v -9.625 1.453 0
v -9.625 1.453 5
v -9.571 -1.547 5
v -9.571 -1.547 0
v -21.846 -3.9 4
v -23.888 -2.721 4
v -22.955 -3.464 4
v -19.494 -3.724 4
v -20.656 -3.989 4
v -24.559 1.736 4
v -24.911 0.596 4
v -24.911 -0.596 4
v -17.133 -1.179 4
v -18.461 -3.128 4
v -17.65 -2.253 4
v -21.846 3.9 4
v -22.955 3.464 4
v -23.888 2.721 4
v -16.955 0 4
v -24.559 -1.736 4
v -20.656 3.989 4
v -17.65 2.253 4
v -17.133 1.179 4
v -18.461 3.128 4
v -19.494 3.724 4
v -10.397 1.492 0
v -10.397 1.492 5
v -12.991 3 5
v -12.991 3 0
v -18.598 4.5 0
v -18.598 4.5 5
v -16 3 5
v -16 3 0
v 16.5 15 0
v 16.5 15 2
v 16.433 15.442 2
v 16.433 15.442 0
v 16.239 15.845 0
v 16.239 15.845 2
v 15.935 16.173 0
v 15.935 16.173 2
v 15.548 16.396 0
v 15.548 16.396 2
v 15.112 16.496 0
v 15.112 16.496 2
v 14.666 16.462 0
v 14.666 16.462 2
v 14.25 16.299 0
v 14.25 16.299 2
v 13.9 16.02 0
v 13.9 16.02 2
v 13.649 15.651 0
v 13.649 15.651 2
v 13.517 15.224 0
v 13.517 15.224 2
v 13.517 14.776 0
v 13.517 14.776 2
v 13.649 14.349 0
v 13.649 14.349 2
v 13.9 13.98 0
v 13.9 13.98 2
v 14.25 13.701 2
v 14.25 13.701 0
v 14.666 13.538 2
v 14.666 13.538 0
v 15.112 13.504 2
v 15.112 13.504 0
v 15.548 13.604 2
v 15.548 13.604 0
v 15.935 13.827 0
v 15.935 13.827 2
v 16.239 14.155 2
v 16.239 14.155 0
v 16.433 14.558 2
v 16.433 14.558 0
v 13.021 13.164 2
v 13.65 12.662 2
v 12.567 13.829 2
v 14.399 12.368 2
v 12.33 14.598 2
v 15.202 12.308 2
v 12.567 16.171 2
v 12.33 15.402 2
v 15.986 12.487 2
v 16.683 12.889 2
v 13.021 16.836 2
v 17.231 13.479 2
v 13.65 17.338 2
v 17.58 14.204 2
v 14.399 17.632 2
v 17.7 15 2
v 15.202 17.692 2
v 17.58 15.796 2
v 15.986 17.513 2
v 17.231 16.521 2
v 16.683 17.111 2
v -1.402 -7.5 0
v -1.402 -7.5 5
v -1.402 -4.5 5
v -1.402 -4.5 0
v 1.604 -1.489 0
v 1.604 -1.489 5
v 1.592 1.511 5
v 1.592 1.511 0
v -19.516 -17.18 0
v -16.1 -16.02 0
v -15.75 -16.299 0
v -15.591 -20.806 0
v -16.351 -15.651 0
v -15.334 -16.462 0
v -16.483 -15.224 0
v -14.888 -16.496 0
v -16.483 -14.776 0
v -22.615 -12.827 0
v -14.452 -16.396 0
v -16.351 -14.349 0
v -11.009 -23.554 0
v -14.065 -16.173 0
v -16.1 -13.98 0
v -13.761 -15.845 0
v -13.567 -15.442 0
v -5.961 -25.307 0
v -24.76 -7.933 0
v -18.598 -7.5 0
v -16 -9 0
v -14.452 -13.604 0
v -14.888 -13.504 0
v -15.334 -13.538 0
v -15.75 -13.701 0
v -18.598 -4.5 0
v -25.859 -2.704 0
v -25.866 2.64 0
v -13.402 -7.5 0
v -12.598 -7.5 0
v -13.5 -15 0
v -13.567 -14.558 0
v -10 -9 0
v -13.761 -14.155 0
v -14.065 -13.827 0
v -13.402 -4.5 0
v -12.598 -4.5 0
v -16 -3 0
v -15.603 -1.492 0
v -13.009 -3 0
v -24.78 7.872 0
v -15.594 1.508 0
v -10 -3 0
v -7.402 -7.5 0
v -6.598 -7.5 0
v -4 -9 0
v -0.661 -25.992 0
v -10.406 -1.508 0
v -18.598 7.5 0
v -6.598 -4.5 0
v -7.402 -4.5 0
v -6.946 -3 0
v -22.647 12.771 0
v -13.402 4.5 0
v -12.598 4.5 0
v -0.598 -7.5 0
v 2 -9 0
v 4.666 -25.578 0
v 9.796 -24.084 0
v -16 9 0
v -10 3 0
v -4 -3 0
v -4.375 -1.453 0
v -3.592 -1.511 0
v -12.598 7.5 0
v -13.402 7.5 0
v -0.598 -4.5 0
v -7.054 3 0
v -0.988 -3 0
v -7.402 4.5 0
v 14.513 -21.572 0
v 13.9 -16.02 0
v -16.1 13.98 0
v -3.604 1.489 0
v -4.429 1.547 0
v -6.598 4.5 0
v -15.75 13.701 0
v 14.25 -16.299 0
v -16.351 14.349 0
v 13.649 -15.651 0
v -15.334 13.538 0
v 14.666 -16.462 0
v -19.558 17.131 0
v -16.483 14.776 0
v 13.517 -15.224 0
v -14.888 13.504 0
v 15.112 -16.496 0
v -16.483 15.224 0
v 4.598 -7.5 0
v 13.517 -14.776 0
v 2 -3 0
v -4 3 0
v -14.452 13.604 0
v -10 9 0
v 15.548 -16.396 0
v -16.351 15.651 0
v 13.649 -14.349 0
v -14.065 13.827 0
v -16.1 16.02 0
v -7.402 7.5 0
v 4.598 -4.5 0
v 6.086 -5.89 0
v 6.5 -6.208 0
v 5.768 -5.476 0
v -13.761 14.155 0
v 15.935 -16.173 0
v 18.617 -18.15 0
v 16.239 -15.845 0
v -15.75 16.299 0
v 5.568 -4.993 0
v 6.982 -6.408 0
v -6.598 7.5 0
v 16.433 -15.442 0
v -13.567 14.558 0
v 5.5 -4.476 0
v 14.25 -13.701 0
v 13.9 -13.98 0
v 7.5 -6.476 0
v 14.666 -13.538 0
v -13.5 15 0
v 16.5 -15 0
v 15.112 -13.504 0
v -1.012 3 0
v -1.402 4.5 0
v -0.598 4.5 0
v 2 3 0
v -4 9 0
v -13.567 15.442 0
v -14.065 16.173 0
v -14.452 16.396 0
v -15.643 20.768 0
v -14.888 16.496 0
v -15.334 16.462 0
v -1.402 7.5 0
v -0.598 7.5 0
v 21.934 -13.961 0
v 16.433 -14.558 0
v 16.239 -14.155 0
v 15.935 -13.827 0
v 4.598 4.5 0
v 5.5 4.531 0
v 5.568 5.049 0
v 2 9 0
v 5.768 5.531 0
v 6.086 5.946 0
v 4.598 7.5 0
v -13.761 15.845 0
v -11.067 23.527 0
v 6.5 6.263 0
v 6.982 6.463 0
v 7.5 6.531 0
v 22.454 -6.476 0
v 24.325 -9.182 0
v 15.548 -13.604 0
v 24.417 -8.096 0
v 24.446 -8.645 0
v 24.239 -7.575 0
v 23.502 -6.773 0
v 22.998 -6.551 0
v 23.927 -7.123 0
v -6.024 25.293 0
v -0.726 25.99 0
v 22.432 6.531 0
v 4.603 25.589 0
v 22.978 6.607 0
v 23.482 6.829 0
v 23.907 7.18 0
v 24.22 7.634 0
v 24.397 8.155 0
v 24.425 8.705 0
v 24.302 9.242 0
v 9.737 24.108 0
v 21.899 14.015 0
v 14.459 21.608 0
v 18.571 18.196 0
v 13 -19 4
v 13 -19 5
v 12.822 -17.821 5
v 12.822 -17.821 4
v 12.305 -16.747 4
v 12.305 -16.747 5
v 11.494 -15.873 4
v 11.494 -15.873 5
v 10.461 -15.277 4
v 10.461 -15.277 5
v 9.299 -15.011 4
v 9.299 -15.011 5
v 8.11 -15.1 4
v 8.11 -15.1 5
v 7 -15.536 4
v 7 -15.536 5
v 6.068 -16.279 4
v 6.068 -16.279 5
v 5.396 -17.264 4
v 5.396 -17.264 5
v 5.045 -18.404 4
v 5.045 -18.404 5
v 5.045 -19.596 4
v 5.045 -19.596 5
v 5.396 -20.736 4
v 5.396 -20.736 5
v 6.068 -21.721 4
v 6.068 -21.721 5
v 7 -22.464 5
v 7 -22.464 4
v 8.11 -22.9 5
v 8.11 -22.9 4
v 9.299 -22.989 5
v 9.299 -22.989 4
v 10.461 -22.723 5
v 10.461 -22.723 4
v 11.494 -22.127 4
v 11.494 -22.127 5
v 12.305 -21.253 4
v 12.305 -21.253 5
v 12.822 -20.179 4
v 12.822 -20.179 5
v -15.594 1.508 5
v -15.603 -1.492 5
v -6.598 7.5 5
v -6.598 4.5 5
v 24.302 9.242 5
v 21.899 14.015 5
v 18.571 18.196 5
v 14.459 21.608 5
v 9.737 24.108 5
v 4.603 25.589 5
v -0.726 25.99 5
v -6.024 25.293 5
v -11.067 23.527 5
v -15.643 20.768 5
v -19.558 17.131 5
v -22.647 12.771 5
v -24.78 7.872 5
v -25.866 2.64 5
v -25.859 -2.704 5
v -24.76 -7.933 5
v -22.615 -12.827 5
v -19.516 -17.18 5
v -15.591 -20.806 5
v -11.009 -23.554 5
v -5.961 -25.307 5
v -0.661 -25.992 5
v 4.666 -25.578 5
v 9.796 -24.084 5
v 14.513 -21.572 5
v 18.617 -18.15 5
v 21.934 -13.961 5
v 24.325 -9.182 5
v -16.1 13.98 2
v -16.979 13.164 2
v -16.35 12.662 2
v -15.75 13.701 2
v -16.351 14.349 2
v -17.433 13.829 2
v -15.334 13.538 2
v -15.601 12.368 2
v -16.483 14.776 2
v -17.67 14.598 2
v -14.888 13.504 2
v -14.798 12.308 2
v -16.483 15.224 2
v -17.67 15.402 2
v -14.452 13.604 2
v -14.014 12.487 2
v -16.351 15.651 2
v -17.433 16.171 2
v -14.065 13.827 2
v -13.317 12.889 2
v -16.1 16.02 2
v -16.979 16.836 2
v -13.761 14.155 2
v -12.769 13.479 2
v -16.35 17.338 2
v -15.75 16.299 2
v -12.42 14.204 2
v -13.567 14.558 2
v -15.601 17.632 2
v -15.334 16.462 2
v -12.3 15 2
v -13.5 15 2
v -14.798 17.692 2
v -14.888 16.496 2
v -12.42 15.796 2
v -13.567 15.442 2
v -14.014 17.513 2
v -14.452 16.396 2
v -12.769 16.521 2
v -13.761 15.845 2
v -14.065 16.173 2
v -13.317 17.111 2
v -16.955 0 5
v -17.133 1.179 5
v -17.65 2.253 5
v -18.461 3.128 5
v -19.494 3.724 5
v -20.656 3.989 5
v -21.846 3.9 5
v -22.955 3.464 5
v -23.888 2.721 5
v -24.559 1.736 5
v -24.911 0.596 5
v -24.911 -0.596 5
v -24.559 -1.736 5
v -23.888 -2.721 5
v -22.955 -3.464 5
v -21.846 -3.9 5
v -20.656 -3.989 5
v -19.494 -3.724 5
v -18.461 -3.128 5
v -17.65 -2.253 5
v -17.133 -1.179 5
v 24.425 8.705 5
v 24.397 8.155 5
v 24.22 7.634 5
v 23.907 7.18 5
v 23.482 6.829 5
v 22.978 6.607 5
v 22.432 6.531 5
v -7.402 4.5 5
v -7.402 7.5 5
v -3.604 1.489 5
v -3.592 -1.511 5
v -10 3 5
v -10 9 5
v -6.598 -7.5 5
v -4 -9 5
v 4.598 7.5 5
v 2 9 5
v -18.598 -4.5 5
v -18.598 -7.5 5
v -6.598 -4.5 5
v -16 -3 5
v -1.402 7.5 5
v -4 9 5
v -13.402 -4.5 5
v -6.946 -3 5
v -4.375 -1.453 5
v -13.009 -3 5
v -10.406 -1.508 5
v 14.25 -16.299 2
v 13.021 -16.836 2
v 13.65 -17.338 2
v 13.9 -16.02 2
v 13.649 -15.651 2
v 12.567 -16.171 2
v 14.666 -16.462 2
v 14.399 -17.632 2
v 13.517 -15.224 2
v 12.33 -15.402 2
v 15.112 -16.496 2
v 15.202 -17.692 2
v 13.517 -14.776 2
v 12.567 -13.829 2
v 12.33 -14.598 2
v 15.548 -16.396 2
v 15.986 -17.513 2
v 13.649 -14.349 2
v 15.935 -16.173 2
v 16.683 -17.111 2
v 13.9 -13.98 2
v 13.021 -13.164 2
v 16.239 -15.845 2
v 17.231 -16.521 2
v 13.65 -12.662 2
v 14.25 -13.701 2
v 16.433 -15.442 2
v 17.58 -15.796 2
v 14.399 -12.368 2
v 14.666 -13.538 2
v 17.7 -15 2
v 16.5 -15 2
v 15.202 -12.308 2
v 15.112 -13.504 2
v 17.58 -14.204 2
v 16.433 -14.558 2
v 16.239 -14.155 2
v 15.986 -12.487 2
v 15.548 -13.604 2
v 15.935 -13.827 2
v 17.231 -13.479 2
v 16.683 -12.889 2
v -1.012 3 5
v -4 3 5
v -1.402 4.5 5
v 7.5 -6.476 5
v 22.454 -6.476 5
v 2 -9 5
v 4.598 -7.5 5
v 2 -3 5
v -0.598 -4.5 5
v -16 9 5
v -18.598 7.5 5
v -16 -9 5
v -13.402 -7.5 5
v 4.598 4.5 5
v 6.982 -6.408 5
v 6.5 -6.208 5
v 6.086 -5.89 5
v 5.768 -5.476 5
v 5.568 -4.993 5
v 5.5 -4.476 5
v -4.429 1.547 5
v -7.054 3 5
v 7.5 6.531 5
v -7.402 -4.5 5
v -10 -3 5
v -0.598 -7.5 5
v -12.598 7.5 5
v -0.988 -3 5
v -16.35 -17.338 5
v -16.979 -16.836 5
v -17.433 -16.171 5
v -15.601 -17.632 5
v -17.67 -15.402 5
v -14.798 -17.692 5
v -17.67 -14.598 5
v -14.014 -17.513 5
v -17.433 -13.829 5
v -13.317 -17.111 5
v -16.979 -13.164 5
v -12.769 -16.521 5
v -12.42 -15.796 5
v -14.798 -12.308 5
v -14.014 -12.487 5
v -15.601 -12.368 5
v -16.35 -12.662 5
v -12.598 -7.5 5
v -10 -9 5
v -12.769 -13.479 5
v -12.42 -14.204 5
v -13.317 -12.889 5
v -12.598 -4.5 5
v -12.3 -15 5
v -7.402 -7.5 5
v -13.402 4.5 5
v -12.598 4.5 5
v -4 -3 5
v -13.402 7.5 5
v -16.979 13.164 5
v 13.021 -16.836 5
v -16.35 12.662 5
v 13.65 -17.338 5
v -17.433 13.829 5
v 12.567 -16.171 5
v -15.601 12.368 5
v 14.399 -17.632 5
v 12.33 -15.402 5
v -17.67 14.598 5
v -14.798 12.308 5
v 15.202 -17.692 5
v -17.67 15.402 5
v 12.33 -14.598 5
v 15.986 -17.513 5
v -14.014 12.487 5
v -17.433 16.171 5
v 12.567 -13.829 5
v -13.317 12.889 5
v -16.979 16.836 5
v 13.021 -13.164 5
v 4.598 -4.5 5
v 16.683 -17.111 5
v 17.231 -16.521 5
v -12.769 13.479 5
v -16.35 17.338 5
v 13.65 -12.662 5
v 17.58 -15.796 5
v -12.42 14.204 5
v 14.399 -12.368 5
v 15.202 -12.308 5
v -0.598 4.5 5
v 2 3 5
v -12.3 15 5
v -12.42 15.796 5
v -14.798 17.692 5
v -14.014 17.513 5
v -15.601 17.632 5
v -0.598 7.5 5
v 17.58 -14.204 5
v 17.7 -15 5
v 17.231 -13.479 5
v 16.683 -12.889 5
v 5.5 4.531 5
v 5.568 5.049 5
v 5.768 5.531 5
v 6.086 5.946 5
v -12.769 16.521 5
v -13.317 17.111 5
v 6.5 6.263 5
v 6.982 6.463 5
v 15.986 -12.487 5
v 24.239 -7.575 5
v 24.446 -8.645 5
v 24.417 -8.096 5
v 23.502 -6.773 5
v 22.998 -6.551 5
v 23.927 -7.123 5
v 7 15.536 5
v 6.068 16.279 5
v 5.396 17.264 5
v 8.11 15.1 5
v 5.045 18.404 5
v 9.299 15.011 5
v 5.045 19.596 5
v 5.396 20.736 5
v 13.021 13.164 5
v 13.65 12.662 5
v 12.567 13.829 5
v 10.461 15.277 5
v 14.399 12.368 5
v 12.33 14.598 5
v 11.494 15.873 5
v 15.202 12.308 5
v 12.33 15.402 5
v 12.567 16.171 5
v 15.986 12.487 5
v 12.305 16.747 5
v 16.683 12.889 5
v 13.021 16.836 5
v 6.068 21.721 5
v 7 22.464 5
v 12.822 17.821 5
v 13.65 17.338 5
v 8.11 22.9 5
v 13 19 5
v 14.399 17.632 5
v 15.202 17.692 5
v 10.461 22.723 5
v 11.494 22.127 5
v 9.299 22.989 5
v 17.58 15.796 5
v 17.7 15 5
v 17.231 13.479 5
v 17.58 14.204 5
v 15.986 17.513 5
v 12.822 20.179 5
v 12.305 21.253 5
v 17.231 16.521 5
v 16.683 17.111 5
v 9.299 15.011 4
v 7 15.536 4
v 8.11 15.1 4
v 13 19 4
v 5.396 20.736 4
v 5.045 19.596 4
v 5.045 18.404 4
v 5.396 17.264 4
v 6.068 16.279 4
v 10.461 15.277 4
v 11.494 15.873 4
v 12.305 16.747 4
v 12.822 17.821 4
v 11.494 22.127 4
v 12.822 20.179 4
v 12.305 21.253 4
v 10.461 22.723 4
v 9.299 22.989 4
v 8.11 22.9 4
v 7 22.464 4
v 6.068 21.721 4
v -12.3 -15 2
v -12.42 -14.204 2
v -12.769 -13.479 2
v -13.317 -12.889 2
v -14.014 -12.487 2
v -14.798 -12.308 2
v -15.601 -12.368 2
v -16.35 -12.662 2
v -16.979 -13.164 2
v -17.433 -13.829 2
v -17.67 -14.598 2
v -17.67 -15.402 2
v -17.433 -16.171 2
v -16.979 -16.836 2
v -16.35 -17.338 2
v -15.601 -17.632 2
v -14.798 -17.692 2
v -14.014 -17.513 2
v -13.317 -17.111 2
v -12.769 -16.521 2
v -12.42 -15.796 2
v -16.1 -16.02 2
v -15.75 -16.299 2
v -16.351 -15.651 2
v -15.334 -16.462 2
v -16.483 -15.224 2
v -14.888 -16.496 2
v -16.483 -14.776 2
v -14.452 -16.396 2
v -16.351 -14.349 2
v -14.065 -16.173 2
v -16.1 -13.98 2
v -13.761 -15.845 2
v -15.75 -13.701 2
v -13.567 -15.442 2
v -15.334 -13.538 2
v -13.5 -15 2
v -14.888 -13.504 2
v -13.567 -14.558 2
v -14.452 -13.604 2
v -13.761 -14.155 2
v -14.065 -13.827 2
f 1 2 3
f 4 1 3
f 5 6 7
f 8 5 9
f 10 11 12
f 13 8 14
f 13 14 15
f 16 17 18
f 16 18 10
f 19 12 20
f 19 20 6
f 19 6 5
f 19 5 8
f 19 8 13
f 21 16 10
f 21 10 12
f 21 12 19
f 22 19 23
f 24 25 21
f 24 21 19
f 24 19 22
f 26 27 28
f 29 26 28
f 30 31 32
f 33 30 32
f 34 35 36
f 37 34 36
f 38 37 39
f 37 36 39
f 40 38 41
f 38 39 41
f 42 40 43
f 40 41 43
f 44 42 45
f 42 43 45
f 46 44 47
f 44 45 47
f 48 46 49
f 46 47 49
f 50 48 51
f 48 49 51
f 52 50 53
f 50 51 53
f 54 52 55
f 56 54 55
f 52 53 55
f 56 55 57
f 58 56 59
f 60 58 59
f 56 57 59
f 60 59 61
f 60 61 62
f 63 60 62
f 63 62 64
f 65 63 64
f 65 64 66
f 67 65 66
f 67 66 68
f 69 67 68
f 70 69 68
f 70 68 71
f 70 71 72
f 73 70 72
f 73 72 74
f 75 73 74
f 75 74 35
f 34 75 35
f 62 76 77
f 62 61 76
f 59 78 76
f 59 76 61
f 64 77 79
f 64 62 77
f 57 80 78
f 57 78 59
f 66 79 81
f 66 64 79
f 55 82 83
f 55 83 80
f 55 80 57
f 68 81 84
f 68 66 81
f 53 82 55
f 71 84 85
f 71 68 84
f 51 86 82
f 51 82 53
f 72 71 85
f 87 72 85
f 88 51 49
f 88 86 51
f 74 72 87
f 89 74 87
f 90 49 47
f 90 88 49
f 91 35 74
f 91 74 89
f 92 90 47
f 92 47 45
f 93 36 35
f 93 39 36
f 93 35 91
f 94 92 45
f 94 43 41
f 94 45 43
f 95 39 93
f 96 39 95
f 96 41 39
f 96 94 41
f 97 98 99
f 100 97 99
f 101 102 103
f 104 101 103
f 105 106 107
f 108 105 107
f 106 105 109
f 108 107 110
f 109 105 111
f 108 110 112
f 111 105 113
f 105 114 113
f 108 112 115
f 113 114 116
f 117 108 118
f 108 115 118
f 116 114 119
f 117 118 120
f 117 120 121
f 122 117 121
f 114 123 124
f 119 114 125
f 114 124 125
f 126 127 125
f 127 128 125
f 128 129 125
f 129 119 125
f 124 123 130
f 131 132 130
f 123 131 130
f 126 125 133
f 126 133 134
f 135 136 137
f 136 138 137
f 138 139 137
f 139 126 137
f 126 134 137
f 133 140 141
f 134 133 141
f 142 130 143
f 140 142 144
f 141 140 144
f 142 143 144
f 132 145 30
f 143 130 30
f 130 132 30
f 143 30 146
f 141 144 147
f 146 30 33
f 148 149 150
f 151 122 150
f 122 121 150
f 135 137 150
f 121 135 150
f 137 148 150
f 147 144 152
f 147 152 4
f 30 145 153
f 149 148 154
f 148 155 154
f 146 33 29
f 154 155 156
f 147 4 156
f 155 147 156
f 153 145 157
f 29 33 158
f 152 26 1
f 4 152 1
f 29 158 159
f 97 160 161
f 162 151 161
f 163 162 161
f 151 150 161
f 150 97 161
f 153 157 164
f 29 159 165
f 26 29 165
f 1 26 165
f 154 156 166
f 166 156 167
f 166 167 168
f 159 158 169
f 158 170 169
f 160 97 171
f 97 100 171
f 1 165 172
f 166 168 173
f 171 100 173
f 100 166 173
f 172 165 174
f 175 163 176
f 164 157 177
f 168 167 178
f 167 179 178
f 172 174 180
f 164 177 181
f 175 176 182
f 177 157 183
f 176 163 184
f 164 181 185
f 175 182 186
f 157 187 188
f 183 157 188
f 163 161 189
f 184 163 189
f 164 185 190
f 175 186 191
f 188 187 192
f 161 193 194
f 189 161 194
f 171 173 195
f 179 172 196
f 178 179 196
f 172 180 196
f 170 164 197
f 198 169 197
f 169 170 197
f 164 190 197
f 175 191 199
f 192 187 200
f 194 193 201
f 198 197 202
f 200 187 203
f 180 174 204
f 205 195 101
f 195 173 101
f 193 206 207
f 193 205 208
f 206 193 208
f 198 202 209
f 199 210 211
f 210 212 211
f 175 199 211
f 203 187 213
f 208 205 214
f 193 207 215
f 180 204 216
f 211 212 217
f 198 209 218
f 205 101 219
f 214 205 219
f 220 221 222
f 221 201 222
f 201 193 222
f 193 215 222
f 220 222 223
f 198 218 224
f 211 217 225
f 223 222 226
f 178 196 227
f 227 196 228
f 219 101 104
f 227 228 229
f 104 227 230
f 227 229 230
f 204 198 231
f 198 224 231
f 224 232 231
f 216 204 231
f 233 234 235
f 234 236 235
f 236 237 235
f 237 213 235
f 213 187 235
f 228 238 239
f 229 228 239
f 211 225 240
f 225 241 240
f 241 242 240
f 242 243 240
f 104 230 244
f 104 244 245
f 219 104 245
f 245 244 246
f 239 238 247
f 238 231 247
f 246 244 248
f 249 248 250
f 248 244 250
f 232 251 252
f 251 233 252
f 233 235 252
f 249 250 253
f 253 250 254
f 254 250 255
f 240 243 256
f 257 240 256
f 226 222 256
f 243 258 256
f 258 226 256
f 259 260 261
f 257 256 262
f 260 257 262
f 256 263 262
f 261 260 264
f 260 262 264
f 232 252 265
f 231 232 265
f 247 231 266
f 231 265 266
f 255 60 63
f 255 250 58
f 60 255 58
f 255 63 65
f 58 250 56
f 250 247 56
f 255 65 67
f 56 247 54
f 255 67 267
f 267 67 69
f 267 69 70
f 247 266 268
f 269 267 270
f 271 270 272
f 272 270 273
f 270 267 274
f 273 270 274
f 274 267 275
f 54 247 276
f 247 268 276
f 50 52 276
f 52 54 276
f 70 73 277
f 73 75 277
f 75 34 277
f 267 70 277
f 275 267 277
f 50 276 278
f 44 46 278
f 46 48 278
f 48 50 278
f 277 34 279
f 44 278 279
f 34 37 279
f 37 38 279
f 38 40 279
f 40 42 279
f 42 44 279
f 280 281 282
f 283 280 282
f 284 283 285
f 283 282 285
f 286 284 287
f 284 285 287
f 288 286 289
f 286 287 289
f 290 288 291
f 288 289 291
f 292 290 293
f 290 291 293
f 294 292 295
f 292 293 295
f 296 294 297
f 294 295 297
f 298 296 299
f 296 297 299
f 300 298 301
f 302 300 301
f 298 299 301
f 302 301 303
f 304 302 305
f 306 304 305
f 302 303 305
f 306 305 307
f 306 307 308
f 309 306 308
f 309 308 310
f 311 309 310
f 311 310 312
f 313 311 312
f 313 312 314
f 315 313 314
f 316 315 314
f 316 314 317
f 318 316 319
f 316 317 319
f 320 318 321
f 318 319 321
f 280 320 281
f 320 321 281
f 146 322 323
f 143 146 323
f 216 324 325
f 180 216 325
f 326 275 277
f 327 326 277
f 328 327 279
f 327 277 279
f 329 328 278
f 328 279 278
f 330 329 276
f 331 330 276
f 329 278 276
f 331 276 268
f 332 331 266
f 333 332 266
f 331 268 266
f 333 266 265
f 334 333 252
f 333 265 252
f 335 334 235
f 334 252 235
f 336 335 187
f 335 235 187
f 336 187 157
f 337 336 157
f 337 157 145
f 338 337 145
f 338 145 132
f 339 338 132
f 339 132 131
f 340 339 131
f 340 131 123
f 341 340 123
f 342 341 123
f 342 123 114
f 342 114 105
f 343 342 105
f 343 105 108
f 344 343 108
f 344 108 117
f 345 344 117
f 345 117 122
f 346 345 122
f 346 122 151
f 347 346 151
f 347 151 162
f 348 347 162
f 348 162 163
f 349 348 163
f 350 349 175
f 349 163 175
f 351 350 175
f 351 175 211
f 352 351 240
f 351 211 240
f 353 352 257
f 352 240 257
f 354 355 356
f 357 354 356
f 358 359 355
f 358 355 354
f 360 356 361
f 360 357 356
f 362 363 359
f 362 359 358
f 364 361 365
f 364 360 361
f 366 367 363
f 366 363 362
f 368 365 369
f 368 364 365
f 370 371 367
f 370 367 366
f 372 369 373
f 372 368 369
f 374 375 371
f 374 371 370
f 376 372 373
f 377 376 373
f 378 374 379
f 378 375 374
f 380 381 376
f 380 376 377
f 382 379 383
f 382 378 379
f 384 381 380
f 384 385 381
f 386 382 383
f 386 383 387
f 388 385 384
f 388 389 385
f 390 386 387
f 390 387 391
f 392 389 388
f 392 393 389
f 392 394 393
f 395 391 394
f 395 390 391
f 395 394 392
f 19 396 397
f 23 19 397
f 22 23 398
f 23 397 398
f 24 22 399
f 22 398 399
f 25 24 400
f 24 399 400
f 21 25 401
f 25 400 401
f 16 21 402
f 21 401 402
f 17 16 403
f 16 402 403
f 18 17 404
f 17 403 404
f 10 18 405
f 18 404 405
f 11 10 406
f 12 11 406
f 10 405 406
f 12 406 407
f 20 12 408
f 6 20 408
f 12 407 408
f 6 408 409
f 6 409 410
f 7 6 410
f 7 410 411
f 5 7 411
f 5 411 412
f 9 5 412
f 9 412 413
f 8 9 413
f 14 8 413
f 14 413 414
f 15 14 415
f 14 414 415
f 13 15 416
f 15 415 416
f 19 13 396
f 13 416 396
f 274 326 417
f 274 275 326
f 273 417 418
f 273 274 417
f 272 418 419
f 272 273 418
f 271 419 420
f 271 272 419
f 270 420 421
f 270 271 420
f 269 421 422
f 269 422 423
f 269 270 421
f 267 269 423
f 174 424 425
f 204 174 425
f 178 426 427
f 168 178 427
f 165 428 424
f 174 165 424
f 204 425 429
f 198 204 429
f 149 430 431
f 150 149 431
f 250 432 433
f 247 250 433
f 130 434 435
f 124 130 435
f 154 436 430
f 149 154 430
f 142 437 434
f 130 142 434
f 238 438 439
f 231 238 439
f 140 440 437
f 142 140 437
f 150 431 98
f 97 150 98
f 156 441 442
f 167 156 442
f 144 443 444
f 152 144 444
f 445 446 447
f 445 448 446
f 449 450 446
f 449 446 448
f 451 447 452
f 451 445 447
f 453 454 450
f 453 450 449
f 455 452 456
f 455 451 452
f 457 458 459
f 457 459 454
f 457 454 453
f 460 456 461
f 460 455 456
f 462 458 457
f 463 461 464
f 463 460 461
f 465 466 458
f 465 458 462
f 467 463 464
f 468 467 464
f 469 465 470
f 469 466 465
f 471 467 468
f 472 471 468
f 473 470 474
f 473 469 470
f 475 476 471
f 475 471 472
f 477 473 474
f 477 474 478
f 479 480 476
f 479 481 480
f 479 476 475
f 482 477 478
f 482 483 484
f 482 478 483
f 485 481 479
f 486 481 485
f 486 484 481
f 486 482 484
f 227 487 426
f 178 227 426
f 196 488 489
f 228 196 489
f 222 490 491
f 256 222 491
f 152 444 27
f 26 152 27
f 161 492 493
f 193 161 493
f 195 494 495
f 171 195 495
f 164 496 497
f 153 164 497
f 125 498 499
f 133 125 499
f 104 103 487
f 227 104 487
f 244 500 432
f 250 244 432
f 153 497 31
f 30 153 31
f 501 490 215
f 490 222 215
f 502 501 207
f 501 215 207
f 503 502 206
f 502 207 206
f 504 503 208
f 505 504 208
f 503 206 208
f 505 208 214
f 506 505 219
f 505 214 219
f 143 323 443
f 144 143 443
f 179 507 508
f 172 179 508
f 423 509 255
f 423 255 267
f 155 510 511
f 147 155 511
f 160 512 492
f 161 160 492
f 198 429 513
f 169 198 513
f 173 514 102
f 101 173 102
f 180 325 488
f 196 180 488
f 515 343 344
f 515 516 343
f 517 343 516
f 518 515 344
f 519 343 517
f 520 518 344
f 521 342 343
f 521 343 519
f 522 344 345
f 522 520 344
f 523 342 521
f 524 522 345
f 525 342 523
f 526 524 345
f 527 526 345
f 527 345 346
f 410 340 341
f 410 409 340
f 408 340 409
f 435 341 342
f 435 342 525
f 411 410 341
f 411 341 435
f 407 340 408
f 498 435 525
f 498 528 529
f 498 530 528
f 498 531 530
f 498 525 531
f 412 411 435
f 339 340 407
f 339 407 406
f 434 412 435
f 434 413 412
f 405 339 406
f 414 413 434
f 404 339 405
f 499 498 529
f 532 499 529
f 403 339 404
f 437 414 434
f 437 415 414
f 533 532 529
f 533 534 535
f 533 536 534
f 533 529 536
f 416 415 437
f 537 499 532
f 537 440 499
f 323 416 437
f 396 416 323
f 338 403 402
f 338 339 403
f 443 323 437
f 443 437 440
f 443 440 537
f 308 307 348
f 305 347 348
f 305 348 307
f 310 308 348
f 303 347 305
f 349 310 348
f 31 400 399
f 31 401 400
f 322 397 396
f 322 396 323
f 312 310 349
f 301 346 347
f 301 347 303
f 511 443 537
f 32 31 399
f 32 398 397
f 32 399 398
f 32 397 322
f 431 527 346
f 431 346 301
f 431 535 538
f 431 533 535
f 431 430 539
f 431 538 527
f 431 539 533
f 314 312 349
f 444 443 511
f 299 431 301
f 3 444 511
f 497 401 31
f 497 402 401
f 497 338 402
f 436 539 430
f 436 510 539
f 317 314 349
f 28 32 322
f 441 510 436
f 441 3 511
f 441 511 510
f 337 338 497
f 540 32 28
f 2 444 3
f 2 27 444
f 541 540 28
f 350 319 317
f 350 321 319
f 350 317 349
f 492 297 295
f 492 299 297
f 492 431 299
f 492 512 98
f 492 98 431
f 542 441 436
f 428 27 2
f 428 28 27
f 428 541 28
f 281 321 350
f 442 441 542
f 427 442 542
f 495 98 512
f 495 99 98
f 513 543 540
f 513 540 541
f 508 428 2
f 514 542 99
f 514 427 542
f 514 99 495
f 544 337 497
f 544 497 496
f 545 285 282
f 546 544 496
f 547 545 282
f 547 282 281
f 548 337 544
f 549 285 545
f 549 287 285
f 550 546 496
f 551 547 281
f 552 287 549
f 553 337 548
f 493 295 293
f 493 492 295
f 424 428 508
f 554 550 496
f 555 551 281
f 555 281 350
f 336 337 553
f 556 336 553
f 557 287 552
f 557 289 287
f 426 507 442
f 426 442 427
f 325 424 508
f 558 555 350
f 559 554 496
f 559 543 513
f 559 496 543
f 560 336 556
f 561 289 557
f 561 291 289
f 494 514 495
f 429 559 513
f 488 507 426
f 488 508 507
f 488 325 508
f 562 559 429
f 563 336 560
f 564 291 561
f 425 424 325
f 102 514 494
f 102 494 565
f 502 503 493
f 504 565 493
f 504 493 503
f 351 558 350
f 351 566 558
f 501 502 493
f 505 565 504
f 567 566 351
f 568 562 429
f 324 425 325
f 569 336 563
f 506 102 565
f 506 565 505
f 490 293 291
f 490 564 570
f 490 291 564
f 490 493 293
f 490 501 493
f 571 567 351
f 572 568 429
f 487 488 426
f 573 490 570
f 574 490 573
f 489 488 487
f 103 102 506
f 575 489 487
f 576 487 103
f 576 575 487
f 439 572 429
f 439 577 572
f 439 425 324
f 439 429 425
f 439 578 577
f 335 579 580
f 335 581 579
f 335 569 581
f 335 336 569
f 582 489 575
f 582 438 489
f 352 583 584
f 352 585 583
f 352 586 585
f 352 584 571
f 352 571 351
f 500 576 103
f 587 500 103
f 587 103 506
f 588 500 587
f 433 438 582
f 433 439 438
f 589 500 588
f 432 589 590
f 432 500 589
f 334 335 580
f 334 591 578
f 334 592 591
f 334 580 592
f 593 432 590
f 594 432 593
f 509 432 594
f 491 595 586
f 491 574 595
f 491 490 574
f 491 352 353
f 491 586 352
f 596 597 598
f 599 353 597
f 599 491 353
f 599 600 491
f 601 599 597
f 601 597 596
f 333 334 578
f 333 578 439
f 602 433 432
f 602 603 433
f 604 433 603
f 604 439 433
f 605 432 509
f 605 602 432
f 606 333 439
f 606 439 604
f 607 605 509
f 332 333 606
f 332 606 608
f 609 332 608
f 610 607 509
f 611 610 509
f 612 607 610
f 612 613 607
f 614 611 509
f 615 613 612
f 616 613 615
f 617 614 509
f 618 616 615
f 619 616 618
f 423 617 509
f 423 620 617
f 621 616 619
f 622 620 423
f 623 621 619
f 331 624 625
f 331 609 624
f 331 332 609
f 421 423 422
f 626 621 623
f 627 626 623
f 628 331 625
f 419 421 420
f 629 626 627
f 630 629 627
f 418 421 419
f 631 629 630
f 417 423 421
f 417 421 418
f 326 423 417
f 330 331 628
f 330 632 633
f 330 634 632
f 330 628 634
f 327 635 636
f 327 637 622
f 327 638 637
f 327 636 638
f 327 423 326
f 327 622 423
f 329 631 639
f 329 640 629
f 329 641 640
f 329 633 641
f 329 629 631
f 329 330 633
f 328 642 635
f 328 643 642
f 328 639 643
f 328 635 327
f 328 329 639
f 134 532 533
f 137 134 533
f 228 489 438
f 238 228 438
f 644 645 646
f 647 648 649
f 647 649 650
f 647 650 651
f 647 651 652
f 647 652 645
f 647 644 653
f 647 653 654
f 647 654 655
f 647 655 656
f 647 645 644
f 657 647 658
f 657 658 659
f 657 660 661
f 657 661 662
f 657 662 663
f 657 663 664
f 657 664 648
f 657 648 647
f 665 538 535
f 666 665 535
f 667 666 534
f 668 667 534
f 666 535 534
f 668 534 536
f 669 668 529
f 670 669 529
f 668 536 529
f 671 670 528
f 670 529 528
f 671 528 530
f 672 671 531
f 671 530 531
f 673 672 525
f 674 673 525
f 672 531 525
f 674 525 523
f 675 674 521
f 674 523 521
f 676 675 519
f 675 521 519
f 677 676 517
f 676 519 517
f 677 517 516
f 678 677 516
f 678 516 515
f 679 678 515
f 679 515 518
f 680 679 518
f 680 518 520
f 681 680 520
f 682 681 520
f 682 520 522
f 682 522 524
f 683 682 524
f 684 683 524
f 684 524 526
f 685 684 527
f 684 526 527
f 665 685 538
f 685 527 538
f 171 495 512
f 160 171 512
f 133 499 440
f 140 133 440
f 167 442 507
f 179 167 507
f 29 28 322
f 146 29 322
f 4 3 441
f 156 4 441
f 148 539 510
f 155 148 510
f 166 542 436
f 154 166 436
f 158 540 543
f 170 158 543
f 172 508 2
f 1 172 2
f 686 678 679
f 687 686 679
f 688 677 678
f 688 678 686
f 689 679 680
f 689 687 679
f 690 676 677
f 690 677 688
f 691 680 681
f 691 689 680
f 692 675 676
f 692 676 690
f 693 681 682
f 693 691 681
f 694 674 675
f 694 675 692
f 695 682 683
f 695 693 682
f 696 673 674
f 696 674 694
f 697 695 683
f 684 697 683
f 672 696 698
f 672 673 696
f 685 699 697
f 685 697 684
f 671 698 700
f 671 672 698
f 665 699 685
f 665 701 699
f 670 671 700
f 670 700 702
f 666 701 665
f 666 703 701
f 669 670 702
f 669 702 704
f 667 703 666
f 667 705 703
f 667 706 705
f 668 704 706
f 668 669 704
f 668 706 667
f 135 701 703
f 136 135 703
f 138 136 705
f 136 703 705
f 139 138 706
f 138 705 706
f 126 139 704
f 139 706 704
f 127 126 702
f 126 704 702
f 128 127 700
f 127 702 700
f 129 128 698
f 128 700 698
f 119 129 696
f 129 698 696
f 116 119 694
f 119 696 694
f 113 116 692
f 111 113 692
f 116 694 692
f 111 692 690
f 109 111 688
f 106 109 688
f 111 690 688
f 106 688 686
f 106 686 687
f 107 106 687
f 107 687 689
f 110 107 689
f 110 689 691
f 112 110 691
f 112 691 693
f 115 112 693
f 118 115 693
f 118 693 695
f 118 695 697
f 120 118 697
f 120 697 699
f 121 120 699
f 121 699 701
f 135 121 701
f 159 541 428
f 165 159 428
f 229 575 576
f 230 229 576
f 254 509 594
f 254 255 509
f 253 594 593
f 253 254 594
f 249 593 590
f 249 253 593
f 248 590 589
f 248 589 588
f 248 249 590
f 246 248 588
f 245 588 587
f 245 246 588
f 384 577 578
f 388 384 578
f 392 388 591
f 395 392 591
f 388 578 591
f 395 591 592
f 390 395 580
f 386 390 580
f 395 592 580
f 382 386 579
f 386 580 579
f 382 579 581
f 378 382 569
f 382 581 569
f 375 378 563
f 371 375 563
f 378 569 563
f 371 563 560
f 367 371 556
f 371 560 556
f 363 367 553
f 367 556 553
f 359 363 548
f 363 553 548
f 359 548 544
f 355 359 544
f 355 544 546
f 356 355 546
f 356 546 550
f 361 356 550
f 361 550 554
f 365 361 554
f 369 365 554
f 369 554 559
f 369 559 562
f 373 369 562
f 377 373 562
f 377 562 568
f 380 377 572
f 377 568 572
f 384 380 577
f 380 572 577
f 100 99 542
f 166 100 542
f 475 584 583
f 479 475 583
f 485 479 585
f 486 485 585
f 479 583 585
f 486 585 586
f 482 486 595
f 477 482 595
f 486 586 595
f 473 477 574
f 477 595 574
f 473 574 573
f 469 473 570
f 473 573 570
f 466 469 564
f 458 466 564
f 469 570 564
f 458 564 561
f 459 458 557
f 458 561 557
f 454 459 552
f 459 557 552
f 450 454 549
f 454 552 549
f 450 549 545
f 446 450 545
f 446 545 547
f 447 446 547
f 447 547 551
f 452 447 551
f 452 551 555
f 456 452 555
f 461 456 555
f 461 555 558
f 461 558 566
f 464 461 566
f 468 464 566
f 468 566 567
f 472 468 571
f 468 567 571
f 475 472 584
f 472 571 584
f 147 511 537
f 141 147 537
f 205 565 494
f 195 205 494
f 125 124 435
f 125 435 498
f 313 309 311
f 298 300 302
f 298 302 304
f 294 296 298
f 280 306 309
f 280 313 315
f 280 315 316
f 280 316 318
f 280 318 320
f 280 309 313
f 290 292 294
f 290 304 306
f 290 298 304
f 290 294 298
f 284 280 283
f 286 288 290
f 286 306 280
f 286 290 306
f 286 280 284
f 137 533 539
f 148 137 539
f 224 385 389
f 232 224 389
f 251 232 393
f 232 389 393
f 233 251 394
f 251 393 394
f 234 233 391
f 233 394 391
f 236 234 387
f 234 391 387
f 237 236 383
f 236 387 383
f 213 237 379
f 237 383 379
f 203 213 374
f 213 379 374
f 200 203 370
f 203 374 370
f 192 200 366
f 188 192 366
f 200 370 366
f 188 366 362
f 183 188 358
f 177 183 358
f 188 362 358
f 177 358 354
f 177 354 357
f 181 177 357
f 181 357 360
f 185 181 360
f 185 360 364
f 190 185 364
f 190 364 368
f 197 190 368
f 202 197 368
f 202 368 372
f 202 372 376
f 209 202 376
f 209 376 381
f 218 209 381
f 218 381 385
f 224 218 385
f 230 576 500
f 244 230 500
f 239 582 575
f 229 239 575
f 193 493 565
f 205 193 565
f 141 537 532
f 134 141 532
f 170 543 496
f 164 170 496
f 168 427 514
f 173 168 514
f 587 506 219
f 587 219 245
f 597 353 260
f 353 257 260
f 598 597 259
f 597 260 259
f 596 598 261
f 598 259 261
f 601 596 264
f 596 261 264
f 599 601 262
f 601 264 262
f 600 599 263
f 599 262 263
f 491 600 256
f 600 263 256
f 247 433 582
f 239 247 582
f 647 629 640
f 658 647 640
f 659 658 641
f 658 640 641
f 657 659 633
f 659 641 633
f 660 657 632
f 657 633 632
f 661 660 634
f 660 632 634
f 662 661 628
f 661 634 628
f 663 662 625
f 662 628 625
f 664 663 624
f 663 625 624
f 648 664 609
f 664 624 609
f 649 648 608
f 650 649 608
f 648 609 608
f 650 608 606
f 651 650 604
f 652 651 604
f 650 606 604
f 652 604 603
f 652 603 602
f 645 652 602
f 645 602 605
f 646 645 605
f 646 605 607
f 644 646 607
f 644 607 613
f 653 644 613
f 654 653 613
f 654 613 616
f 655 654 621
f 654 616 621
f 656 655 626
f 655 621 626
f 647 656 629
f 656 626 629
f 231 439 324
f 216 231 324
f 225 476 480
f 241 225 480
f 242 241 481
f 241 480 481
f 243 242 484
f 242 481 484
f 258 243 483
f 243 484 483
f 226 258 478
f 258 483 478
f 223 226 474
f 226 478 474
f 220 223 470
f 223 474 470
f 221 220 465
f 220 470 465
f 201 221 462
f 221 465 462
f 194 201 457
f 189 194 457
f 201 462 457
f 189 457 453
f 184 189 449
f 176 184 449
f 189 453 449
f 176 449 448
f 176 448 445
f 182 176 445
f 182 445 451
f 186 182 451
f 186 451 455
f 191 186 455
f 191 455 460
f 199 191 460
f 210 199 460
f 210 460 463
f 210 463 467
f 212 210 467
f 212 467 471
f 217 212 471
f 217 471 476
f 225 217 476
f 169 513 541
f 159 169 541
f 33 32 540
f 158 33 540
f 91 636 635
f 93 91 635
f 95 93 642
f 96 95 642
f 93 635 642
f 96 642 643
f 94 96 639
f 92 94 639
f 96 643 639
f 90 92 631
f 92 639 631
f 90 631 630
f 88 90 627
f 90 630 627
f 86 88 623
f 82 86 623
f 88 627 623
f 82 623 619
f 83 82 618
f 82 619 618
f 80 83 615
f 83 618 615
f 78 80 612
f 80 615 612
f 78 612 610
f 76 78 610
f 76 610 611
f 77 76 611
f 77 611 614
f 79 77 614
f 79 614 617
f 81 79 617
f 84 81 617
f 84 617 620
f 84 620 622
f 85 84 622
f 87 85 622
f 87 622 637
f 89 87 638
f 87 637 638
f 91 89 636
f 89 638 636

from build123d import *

# Parameters (mm, degrees)
SKETCH_R        = 25.999973
PAD_DEPTH       = 5
SKETCH001_R     = 1.5
POCKET_DEPTH    = 5.001
SKETCH002_W     = 20.5
SKETCH002_H     = 13.007144
POCKET001_DEPTH = 5
FILLET_R        = 2
POCKET002_DEPTH = 5
SKETCH004_R     = 4.000249
SKETCH004_R_2   = 4
POCKET003_DEPTH = 1
SKETCH005_R     = 2.7
POCKET004_DEPTH = 3


with BuildPart() as part:
    # Sketch → Pad (new body)
    with BuildSketch(Plane.XY):
        Circle(SKETCH_R)
    extrude(amount=PAD_DEPTH)

    # Sketch001 (on Face3 of Pad) → Pocket (cut, through all)
    with BuildSketch(Plane.XY.offset(5)):
        with Locations((-15, 15)):
            Circle(SKETCH001_R)
        with Locations((15, 15)):
            Circle(SKETCH001_R)
        with Locations((15, -15)):
            Circle(SKETCH001_R)
        with Locations((-15, -15)):
            Circle(SKETCH001_R)
    extrude(amount=-POCKET_DEPTH, mode=Mode.SUBTRACT)

    # Sketch002 (on Face3 of Pocket) → Pocket001 (cut)
    with BuildSketch(Plane.XY.offset(5)):
        with Locations((15.75, 0.027864)):
            Rectangle(SKETCH002_W, SKETCH002_H)
    extrude(amount=-POCKET001_DEPTH, mode=Mode.SUBTRACT)

    # Fillet
    fillet_edges = [part.edges().sort_by_distance(p)[0] for p in [
        (5.5, 6.531436, 2.5),
        (5.5, -6.475708, 2.5),
        (25.180624, -6.475708, 2.5),
        (25.166226, 6.531436, 2.5),
    ]]
    fillet(fillet_edges, radius=FILLET_R)

    # Sketch003 (on Face5 of Fillet) → Pocket002 (cut)
    with BuildSketch(Plane.XY.offset(5)):
        Polygon((-16, 9), (-18.598076, 7.5), (-18.598076, 4.5), (-16, 3), (-13.401924, 4.5), (-13.401924, 7.5), align=None)
        Polygon((-10, 9), (-12.598076, 7.5), (-12.598076, 4.5), (-10, 3), (-7.401924, 4.5), (-7.401924, 7.5), align=None)
        Polygon((-4, 9), (-6.598076, 7.5), (-6.598076, 4.5), (-4, 3), (-1.401924, 4.5), (-1.401924, 7.5), align=None)
        Polygon((2, 9), (-0.598076, 7.5), (-0.598076, 4.5), (2, 3), (4.598076, 4.5), (4.598076, 7.5), align=None)
        Polygon((-12.990973, 3), (-15.593563, 1.507818), (-15.60259, -1.492182), (-13.009027, -3), (-10.406437, -1.507818), (-10.39741, 1.492182), align=None)
        Polygon((-7.054188, 3), (-9.62517, 1.453072), (-9.570982, -1.546928), (-6.945812, -3), (-4.37483, -1.453072), (-4.429018, 1.546928), align=None)
        Polygon((-1.012141, 3), (-3.604147, 1.489486), (-3.592006, -1.510514), (-0.987859, -3), (1.604147, -1.489486), (1.592006, 1.510514), align=None)
        Polygon((-16, -3), (-18.598076, -4.5), (-18.598076, -7.5), (-16, -9), (-13.401924, -7.5), (-13.401924, -4.5), align=None)
        Polygon((-10, -3), (-12.598076, -4.5), (-12.598076, -7.5), (-10, -9), (-7.401924, -7.5), (-7.401924, -4.5), align=None)
        Polygon((-4, -3), (-6.598076, -4.5), (-6.598076, -7.5), (-4, -9), (-1.401924, -7.5), (-1.401924, -4.5), align=None)
        Polygon((2, -3), (-0.598076, -4.5), (-0.598076, -7.5), (2, -9), (4.598076, -7.5), (4.598076, -4.5), align=None)
    extrude(amount=-POCKET002_DEPTH, mode=Mode.SUBTRACT)

    # Sketch004 (on Face5 of Pocket002) → Pocket003 (cut)
    with BuildSketch(Plane.XY.offset(5)):
        with Locations((-20.955366, 0)):
            Circle(SKETCH004_R)
        with Locations((9, 19)):
            Circle(SKETCH004_R_2)
        with Locations((9, -19)):
            Circle(SKETCH004_R_2)
    extrude(amount=-POCKET003_DEPTH, mode=Mode.SUBTRACT)

    # Sketch005 (on Face5 of Pocket003) → Pocket004 (cut)
    with BuildSketch(Plane.XY.offset(5)):
        with Locations((-15, 15)):
            Circle(SKETCH005_R)
        with Locations((15, 15)):
            Circle(SKETCH005_R)
        with Locations((15, -15)):
            Circle(SKETCH005_R)
        with Locations((-15, -15)):
            Circle(SKETCH005_R)
    extrude(amount=-POCKET004_DEPTH, mode=Mode.SUBTRACT)


solid = part.part
